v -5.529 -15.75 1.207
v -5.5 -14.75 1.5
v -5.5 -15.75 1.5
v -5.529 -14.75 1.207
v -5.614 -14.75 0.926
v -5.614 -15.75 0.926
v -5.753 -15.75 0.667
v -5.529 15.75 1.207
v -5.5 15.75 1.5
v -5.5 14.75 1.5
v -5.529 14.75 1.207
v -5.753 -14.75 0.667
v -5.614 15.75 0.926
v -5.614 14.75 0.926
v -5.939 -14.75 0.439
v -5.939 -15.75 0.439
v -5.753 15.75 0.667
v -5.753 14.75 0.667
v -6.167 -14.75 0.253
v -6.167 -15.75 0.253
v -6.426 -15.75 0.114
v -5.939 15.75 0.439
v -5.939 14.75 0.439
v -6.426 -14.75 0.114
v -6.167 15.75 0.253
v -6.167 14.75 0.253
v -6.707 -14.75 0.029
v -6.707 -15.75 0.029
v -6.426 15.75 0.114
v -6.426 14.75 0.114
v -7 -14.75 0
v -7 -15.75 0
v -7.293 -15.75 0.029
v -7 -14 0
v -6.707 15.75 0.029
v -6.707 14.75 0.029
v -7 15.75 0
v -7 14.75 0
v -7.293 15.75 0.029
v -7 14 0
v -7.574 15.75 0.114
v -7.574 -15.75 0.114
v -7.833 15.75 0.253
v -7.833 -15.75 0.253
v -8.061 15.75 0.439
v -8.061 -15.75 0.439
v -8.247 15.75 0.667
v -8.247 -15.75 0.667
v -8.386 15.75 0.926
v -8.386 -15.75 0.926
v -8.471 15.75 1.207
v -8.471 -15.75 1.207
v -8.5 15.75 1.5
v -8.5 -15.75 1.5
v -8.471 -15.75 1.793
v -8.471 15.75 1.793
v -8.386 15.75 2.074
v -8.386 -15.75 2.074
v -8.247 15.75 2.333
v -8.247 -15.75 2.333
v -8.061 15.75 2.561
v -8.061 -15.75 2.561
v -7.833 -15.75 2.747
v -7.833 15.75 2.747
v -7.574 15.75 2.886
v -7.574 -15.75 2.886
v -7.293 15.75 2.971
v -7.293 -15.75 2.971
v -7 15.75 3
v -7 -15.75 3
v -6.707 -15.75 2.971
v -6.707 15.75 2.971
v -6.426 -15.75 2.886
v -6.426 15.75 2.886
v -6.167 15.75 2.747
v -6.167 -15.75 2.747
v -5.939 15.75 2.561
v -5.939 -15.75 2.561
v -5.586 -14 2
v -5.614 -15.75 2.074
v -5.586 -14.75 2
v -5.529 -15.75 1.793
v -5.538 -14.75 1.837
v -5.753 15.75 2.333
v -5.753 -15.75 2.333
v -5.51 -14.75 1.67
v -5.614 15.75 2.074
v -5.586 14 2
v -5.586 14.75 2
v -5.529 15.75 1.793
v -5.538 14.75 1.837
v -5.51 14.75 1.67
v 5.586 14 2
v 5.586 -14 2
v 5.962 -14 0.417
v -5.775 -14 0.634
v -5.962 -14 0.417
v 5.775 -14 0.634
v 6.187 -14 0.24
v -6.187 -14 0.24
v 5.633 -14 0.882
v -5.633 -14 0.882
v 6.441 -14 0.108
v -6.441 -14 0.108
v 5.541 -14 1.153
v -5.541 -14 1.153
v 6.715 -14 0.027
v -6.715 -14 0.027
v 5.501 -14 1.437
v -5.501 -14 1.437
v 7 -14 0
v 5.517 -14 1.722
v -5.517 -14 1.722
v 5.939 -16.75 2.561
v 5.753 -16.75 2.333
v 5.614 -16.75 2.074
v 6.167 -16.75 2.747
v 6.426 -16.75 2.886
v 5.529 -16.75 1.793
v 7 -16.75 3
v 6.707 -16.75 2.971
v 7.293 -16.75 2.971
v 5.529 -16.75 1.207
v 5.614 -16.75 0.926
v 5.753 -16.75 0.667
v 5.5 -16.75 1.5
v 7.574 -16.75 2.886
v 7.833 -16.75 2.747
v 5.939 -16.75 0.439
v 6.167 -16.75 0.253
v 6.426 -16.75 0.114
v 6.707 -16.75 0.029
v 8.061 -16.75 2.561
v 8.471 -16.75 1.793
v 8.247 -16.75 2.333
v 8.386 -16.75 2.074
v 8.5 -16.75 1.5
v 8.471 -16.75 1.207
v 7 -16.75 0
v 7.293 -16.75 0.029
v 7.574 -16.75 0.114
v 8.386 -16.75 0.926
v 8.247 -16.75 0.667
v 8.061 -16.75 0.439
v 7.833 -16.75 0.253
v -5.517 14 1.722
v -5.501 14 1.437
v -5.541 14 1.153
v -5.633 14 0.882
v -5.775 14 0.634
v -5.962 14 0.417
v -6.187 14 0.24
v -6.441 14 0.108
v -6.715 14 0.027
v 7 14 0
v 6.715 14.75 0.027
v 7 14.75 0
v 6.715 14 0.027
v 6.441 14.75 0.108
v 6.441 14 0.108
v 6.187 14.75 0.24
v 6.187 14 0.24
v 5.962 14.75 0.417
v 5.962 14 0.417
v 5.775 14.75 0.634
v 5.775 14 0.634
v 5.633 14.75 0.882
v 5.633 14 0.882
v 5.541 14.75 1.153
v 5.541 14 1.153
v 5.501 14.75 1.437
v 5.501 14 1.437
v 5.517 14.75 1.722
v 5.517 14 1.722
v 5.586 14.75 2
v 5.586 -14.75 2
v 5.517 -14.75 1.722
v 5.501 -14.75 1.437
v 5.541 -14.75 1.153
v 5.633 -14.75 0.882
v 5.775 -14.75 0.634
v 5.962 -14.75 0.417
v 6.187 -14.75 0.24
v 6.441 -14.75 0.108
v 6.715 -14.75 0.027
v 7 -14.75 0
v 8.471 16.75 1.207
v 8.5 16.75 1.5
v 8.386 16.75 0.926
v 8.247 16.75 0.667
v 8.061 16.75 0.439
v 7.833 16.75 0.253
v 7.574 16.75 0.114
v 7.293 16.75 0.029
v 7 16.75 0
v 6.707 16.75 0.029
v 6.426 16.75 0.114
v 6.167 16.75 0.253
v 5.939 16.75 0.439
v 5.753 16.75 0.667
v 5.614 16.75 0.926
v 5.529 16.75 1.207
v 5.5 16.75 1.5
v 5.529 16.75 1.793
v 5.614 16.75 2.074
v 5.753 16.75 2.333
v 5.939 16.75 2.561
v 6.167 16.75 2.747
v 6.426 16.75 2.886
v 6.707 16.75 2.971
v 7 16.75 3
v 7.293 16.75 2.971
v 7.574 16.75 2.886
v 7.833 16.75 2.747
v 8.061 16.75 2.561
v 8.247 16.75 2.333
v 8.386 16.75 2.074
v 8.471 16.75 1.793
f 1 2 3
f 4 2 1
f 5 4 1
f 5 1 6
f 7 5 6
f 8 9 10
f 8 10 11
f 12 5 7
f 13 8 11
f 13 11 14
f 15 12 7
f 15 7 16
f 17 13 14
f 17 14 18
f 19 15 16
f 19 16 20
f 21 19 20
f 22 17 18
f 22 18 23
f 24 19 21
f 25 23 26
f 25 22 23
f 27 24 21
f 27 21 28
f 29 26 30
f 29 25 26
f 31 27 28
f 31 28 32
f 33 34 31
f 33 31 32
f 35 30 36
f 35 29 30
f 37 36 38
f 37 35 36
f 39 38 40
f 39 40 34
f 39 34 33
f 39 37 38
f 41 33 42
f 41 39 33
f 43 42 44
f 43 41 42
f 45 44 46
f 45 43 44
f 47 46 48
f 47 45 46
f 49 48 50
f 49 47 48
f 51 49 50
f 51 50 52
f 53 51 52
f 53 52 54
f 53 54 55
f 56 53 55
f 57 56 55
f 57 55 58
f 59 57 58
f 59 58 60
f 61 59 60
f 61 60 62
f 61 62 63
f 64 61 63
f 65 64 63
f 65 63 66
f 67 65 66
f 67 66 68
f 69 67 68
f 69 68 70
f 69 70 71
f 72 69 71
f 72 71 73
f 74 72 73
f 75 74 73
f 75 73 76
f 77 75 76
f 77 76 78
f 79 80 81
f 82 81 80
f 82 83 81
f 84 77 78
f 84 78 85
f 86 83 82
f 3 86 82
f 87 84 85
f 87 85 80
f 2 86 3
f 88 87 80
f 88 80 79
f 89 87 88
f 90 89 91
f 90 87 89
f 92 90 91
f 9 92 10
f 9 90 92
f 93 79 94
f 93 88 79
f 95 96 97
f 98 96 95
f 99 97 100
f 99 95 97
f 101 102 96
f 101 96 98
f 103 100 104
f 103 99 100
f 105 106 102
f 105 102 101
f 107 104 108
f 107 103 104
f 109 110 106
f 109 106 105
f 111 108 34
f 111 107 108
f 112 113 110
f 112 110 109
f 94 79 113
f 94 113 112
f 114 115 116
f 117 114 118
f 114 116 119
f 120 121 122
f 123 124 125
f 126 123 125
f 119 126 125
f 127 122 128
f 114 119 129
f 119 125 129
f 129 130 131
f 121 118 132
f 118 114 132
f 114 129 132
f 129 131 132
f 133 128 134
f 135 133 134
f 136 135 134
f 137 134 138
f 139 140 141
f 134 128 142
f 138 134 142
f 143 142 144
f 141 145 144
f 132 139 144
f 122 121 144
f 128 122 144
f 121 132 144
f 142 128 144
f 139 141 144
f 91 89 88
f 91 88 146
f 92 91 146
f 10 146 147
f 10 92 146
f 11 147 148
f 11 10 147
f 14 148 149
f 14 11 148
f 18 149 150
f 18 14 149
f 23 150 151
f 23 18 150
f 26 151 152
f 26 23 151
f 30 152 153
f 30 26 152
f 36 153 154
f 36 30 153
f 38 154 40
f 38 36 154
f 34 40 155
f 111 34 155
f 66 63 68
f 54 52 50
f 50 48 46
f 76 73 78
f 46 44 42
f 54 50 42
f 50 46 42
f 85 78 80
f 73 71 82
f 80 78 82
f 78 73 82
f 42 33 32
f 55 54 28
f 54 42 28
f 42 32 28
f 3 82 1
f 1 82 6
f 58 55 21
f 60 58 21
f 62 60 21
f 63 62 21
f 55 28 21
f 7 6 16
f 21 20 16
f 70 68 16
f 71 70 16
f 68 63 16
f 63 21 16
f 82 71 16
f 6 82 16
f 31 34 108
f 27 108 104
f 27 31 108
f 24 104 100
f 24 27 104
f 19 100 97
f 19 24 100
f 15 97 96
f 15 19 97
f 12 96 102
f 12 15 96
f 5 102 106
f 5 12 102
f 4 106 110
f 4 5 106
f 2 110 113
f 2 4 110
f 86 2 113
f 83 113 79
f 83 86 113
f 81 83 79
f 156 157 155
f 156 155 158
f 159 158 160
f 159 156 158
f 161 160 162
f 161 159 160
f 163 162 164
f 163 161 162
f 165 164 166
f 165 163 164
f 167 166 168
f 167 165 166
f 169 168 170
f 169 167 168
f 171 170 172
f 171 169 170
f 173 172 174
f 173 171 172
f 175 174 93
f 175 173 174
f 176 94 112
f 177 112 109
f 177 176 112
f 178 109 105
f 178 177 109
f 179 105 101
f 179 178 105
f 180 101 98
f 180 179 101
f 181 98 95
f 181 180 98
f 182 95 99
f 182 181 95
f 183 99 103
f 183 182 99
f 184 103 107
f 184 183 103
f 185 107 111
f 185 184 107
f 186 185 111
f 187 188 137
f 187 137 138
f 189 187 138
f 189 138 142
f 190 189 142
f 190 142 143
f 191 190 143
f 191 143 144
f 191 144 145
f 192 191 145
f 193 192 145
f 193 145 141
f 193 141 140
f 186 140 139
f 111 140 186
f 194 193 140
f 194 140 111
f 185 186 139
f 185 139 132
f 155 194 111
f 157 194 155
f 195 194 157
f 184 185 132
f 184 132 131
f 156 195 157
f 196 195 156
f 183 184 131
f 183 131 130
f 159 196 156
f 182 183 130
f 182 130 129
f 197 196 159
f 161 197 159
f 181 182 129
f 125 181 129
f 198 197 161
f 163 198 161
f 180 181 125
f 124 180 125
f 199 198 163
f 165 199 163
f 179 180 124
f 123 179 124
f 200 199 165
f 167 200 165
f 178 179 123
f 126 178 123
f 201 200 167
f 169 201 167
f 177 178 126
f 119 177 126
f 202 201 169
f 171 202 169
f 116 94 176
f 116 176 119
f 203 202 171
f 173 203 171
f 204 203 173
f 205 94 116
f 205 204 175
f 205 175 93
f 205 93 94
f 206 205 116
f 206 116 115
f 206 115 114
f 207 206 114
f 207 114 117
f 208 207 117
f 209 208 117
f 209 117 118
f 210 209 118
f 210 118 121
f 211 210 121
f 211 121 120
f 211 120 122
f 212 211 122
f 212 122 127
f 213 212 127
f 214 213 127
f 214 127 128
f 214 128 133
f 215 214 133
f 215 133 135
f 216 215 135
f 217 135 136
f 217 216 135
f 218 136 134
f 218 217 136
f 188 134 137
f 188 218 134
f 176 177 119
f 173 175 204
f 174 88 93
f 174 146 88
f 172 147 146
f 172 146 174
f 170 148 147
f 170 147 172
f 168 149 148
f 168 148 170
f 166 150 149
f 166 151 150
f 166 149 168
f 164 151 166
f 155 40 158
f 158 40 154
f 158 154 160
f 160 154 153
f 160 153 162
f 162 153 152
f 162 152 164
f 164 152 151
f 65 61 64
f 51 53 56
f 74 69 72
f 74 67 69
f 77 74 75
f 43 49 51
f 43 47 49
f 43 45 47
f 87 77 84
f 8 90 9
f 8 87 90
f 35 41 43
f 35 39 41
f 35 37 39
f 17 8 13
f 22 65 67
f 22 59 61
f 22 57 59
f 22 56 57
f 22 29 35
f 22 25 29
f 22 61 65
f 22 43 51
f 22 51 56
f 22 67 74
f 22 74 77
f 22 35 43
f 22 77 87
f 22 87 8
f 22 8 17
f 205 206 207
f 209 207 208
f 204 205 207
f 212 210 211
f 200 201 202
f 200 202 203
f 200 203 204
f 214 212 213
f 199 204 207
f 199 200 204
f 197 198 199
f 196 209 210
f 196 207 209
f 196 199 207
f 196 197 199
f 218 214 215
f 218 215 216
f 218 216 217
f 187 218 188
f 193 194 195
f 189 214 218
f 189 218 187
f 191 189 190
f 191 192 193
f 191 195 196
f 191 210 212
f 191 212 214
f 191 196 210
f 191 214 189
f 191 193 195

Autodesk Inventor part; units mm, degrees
ref_plane "YZ Plane" through (0, 0, 0) normal (1, 0, 0) x (0, 1, 0)
sketch "Sketch1" plane through (0, 0, 0) normal (0, 0, 1) x (1, 0, 0)
  line L0 (-9.8, 0) -> (9.8, 0) construction
  line L1 (0, -20.65) -> (0, 20.65) construction
  line L2 (7, -14.75) -> (-7, -14.75)
  line L3 (-7, -14.75) -> (-7, 14.75)
  line L4 (-7, 14.75) -> (7, 14.75)
  line L5 (7, 14.75) -> (7, -14.75)
  line L6 (7, -14.75) -> (-7, 14.75) construction
  line L7 (-7, -14.75) -> (7, 14.75) construction
  point P0 (0, 0)
  dimension "d0" = 14
  dimension "d1" = 29.5
extrude "Extrusion1" add sketch "Sketch1" along normal blind 2
ref_plane "Work Plane1" through (-7, 16.75, 0) normal (0, 1, 0) x (1, 0, 0)
sketch "Sketch2" plane through (-7, 16.75, 0) normal (0, 1, 0) x (1, 0, 0)
  line L0 (0, 0) -> (14, 0) construction
  line L1 (0, 0) -> (0, -2) construction
  line L2 (14, -2) -> (0, -2) construction
  line L3 (14, 0) -> (14, -2) construction
  circle A0 centre (14, -1.5) radius 1.5
  point P0 (7, 0)
  dimension "d5" = 3
extrude "Extrusion2" add sketch "Sketch2" against normal blind 33.5
ref_plane "Work Plane2" through (-7, 15.75, 2) normal (0, 1, 0) x (1, 0, 0)
sketch "Sketch3" plane through (-7, 15.75, 2) normal (0, 1, 0) x (1, 0, 0)
  arc A0 (14, 2) -> (12.5858, 0) centre (14, 0.5) ccw construction
  line L0 (0, 2) -> (14, 2) construction
  line L1 (0, 2) -> (0, 0) construction
  line L2 (12.5858, 0) -> (0, 0) construction
  line L3 (0, 2) -> (0, 0) projected
  circle A1 centre (0, 0.5) radius 1.5
  point P0 (7, 2)
  dimension "d9" = 3
extrude "Extrusion3" add sketch "Sketch3" against normal blind 31.5
sketch "Skizze5" plane through (-7, 14.75, 0) normal (0, 1, 0) x (1, 0, 0)
  arc A0 (1.4142, -2) -> (0, 0) centre (0, -1.5) ccw projected
  line L0 (12.5858, -2) -> (1.4142, -2) projected
  arc A1 (14, 0) -> (12.5858, -2) centre (14, -1.5) ccw projected
  line L1 (0, 0) -> (14, 0) projected
  point P0 (7, 0)
extrude "Extrusion4" cut sketch "Skizze5" against normal blind 0.75
sketch "Skizze6" plane through (-7, -14.75, 0) normal (0, -1, 0) x (1, 0, 0)
  arc A0 (0, 0) -> (1.4142, 2) centre (0, 1.5) ccw projected
  line L0 (14, 0) -> (0, 0) projected
  arc A1 (12.5858, 2) -> (14, 0) centre (14, 1.5) ccw projected
  line L1 (1.4142, 2) -> (12.5858, 2) projected
  point P0 (7, 0)
extrude "Extrusion5" cut sketch "Skizze6" against normal blind 0.75
equation "\"d6\" = d1 + 2 * d4"
equation "\"d4\" = 2"
properties part number "20_Rect_Aperture_door_slide"
